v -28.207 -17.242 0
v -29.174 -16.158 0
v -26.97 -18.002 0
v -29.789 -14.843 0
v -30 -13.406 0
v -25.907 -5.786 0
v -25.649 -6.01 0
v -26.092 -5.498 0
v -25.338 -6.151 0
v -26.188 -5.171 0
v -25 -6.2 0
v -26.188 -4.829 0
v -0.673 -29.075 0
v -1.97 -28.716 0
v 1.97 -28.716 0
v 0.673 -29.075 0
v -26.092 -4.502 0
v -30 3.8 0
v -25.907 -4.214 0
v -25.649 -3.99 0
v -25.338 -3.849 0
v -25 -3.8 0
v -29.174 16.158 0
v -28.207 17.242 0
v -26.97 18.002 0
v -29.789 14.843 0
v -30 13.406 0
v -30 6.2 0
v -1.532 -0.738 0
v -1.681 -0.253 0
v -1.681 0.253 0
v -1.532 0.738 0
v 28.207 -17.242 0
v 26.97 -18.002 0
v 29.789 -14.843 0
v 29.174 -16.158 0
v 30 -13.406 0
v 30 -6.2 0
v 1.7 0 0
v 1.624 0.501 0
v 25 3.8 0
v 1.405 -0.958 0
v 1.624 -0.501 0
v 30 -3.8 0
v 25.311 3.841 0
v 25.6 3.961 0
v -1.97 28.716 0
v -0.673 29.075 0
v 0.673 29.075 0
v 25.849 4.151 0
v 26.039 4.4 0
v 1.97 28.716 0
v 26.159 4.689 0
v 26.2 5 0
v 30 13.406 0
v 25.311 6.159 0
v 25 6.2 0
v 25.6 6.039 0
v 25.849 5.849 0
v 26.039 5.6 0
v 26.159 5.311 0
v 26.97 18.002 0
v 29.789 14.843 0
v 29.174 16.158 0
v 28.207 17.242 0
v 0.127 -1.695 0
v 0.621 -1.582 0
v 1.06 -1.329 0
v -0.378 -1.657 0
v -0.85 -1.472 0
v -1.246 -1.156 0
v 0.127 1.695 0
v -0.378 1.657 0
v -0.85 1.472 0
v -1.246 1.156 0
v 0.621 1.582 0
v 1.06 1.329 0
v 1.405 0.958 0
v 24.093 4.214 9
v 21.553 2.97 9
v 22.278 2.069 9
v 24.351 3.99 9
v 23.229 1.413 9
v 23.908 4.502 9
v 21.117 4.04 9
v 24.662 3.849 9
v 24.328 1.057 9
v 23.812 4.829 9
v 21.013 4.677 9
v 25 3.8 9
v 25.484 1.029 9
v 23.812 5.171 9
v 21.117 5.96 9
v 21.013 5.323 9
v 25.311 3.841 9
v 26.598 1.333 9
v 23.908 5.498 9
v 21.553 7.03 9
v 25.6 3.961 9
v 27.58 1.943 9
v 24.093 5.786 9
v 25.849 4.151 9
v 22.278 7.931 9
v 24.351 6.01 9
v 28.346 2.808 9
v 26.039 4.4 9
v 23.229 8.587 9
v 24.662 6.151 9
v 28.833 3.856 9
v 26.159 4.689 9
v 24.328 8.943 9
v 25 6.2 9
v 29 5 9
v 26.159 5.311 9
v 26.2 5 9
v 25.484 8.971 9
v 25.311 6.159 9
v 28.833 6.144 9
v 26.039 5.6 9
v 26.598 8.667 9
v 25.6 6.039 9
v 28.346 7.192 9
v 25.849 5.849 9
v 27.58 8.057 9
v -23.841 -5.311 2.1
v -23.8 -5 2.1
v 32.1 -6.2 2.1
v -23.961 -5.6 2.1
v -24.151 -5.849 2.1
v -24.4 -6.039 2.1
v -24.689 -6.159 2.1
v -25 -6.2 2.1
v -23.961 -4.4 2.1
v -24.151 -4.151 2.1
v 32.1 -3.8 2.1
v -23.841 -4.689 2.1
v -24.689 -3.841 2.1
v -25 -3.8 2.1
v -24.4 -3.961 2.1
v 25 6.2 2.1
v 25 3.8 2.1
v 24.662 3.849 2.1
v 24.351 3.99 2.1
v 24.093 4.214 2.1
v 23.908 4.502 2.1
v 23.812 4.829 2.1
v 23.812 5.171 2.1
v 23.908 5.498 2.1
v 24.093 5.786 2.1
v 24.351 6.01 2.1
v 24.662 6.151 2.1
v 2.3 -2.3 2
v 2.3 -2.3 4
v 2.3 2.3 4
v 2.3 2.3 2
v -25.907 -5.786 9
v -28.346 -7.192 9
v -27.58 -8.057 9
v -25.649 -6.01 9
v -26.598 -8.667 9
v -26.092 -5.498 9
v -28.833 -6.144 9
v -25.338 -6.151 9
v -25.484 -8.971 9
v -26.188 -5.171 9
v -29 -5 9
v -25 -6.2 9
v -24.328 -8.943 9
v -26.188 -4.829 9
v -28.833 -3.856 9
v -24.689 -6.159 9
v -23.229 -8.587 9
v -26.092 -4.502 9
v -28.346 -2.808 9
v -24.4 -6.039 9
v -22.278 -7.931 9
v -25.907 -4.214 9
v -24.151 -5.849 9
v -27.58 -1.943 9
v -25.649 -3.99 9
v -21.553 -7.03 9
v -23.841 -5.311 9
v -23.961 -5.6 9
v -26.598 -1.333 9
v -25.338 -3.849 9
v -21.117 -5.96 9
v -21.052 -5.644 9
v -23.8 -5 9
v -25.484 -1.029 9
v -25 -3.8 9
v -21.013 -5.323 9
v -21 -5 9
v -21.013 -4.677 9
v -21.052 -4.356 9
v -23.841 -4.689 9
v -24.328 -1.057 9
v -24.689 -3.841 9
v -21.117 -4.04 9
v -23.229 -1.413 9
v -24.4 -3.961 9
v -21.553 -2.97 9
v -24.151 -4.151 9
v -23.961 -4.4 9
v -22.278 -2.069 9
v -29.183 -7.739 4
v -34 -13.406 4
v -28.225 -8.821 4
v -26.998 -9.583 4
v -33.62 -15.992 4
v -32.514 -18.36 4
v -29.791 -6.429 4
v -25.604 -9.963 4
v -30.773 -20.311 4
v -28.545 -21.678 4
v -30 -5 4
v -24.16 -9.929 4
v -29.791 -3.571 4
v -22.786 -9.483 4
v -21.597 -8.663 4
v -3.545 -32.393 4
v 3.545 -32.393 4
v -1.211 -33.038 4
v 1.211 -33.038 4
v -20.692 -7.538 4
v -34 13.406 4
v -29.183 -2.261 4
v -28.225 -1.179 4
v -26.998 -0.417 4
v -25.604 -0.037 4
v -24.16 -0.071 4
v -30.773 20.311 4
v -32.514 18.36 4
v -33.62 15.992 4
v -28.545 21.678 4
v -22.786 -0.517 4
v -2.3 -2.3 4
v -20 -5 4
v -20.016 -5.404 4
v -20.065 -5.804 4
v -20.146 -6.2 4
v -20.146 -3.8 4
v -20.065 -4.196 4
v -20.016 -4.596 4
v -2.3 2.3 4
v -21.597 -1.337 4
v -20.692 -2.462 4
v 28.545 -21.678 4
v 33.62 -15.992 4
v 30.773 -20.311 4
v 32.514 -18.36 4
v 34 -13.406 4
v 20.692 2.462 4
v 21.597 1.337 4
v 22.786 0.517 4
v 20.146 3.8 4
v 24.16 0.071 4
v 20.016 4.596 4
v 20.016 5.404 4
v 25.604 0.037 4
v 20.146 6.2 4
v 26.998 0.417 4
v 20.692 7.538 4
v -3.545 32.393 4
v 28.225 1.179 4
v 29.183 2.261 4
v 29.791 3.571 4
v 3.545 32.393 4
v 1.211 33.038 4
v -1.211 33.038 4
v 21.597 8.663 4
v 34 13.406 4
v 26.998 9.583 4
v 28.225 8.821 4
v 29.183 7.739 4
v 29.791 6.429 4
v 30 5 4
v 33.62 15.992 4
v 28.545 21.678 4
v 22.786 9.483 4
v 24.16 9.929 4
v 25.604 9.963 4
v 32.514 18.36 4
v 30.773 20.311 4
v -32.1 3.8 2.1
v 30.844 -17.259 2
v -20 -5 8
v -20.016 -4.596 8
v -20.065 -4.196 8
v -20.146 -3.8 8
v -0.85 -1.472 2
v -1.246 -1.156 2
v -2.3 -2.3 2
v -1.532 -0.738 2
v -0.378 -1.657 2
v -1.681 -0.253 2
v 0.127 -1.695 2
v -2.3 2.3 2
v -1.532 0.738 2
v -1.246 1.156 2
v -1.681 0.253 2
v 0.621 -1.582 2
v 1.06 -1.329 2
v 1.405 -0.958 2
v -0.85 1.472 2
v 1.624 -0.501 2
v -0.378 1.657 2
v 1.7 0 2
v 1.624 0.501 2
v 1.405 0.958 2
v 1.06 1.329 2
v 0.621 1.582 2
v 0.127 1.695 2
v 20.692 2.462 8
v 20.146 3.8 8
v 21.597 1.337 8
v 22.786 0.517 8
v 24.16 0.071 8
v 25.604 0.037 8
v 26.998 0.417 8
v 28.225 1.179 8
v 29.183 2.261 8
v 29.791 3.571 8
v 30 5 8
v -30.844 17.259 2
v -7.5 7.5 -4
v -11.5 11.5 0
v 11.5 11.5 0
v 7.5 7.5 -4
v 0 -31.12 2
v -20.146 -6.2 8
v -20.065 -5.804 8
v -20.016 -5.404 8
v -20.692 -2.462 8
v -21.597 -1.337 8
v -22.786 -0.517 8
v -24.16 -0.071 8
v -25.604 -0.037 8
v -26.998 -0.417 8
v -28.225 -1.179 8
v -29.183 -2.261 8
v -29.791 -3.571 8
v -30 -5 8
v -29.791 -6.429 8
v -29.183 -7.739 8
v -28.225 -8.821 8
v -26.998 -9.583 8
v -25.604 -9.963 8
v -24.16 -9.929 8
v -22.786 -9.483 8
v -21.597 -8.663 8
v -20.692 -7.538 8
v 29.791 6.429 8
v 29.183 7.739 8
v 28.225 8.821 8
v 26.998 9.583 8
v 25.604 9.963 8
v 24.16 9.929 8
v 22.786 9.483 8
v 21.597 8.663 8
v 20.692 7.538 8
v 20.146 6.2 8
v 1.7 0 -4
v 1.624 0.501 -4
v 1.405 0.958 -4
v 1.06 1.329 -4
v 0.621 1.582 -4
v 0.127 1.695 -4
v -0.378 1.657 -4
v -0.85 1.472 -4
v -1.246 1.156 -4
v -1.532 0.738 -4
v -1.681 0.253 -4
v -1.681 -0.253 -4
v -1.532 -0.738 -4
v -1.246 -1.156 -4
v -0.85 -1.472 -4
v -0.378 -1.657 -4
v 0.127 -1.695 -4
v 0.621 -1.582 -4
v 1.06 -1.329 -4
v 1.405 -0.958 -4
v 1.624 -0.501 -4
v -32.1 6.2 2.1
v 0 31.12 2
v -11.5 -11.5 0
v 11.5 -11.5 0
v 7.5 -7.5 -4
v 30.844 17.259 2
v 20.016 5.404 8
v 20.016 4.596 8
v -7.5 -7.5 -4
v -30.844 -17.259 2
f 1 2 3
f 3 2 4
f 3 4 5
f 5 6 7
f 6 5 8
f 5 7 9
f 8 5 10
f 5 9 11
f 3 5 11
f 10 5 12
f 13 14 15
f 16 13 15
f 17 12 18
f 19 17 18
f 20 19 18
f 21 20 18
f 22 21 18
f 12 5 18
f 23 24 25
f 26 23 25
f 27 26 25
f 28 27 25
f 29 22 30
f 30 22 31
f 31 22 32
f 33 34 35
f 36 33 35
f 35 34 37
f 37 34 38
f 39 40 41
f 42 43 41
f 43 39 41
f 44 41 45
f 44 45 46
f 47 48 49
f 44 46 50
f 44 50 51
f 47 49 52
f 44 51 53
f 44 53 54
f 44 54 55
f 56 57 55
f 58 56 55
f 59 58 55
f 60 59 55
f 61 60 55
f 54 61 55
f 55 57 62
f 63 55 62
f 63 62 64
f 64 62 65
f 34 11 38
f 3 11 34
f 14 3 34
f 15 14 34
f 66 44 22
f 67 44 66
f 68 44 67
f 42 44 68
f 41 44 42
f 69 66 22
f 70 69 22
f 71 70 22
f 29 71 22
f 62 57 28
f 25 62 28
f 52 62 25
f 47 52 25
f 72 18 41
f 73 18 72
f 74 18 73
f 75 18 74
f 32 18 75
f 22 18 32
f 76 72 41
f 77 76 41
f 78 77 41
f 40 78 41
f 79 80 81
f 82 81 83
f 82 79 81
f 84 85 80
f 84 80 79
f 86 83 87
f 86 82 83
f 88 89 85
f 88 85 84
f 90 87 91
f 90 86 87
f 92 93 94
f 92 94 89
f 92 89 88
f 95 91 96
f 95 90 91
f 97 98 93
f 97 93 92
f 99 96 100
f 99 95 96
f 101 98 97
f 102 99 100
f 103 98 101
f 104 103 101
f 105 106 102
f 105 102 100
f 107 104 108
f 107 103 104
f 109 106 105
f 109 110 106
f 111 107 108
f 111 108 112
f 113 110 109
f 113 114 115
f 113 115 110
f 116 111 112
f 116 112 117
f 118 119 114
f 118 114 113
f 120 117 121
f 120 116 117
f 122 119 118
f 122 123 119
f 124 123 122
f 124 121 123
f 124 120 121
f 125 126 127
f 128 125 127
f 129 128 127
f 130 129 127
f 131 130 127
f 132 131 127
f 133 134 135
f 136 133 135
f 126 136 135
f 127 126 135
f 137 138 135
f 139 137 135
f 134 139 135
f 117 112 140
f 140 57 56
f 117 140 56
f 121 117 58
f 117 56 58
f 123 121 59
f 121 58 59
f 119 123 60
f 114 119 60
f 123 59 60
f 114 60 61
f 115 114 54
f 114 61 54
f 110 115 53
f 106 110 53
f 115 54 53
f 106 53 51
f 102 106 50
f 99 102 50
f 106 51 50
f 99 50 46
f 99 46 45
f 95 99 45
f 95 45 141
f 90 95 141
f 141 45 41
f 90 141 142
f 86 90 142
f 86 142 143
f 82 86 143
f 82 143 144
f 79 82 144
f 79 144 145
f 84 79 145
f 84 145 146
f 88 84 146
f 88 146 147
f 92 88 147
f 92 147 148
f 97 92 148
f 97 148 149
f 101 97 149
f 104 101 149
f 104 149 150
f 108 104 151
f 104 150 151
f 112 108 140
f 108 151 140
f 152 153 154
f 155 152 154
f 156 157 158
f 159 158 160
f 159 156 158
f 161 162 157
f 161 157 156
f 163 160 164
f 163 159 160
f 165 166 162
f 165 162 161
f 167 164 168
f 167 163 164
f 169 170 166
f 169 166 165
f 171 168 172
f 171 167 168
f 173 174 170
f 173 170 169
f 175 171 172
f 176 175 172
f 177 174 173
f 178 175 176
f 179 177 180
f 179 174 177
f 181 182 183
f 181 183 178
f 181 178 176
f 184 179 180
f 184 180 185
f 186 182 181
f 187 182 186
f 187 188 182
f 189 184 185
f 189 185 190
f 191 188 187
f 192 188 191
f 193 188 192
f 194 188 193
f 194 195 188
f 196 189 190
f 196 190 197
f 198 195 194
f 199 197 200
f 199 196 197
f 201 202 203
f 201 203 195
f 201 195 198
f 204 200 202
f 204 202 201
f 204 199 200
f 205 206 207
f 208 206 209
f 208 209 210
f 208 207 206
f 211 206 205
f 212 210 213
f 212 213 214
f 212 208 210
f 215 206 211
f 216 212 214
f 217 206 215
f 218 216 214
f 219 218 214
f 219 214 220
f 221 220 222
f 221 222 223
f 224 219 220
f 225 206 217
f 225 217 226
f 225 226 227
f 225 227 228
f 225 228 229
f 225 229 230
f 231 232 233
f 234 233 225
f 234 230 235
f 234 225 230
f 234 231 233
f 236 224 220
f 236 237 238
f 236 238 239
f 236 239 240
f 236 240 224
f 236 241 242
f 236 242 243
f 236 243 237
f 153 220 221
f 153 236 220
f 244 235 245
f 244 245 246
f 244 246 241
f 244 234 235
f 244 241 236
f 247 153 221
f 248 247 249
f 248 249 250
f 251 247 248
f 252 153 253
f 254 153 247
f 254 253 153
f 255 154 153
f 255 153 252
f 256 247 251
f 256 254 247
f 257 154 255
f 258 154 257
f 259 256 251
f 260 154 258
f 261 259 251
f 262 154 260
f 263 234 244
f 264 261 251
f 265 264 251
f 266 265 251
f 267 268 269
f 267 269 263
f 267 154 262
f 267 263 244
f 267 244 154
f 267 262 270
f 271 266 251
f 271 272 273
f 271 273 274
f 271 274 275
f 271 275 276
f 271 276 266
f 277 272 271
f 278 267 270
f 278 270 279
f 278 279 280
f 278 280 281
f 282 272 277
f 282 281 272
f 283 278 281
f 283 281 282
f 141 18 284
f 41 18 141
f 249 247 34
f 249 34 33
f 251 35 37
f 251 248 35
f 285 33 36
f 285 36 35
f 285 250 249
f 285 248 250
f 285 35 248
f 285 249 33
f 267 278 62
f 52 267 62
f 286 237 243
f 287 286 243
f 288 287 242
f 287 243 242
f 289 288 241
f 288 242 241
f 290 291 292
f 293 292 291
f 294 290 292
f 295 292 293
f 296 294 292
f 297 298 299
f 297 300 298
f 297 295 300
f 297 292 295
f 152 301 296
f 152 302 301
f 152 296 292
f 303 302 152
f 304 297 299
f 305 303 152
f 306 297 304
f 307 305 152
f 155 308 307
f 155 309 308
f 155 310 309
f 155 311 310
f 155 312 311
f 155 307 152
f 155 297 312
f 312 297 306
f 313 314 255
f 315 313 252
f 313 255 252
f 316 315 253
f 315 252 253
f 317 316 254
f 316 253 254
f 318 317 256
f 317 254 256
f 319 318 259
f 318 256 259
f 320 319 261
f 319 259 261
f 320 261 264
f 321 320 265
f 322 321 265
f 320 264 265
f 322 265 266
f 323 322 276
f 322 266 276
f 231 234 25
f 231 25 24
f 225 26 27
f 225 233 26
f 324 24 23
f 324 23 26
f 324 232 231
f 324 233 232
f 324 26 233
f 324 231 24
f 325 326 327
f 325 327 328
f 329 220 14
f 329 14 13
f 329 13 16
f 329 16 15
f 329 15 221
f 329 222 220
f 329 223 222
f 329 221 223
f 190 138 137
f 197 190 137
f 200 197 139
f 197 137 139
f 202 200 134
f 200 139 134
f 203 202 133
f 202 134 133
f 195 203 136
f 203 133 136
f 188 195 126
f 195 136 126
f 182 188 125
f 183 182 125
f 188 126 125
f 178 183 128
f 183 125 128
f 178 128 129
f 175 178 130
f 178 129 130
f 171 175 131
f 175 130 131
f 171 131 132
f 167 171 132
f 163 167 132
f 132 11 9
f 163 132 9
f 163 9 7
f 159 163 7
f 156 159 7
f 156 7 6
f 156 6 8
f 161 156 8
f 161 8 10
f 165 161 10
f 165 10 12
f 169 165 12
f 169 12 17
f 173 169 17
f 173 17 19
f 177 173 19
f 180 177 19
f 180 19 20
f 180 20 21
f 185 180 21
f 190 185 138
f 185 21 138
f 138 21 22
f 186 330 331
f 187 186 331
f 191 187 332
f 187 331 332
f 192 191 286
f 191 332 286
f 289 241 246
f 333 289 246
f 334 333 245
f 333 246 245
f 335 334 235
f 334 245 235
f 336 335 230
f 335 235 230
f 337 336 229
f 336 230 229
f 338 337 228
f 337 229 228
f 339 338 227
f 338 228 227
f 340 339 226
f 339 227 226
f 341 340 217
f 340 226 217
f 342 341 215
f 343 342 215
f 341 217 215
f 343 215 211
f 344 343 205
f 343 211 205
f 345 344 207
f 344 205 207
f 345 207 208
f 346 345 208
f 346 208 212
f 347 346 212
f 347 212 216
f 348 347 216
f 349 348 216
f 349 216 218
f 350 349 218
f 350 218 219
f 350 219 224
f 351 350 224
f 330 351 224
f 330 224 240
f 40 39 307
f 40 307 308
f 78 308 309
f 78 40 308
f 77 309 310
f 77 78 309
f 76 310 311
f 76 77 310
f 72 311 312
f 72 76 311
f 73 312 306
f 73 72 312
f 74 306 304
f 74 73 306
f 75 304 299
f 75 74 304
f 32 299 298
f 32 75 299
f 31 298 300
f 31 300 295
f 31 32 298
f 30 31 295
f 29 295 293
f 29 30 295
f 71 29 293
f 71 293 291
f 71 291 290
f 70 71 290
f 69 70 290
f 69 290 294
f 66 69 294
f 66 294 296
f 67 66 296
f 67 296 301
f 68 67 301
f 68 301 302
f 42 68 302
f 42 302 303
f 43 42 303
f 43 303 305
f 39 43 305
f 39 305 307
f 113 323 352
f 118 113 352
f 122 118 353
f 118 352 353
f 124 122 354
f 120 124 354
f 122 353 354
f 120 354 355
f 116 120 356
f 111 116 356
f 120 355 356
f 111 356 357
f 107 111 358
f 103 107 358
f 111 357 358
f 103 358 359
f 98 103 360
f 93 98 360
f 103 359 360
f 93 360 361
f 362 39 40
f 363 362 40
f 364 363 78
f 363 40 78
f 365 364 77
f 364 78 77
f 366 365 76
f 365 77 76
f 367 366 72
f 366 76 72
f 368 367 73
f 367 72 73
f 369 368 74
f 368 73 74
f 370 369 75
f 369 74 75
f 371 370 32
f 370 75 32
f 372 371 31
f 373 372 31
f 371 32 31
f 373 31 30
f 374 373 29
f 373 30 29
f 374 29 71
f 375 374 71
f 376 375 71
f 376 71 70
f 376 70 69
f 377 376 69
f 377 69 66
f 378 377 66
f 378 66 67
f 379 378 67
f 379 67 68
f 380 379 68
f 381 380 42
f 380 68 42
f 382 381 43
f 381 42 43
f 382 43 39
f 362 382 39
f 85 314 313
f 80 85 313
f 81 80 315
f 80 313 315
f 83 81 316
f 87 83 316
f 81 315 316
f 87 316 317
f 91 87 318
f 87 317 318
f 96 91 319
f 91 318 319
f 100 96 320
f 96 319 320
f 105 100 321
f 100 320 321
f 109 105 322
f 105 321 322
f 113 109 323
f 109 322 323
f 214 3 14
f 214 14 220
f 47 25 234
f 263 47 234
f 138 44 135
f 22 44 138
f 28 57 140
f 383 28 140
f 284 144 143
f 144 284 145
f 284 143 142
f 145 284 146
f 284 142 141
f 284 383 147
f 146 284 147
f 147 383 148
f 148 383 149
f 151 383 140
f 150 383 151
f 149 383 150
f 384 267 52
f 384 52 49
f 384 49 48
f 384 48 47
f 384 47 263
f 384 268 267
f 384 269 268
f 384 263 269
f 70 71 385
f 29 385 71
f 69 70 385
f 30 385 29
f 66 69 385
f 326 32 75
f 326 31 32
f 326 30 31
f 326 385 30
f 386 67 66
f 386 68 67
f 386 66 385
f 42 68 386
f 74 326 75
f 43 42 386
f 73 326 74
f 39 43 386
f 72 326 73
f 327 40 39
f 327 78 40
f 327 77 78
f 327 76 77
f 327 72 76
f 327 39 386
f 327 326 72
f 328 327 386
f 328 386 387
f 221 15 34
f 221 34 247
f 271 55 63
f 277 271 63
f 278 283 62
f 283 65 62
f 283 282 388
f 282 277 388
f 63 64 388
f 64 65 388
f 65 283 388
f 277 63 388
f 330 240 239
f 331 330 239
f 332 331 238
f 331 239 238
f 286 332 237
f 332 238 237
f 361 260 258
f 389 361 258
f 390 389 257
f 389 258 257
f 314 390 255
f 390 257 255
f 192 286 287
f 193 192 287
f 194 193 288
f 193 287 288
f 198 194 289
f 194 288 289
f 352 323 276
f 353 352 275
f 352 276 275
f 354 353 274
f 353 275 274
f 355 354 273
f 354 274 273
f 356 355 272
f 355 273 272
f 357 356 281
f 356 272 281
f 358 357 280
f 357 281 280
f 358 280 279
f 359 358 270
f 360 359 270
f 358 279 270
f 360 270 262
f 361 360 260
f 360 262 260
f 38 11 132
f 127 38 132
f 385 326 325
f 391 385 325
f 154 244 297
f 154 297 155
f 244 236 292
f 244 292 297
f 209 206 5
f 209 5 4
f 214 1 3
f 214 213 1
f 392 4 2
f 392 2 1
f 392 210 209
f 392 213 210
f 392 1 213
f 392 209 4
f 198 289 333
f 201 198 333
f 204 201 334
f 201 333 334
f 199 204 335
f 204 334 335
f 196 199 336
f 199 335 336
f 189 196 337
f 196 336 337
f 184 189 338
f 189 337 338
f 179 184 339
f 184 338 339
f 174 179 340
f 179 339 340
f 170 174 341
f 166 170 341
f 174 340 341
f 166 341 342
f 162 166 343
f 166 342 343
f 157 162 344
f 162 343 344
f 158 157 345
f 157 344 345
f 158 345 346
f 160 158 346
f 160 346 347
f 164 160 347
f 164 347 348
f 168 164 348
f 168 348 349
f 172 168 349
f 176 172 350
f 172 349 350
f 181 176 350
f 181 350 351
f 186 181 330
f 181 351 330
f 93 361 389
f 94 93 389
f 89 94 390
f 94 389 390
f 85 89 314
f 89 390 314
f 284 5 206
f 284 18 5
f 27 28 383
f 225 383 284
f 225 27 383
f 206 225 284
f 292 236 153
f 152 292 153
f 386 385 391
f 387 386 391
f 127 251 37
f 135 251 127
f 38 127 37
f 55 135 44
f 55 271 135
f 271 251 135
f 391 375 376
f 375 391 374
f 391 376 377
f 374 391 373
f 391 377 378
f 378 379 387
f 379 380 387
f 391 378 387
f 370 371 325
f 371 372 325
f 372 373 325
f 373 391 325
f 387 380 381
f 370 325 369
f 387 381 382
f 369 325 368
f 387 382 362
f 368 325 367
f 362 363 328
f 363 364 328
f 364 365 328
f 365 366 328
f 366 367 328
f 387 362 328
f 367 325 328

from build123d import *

# Parameters (mm, degrees)
F0_W           = 25
F0_H           = 6.3
F0_H_2         = 2.4
F0_H_3         = 7.6
F0_R           = 1.7
F0_W_2         = 22.5
F1_DEPTH       = 4
F2_DEPTH       = 9
F3_DEPTH       = 2.1
F4_DEPTH       = 4
F5_T1_DEPTH    = 50.7168298797
F5_T3_DEPTH    = 50.7168298797
F5_2_T1_DEPTH  = 27.1991896638
F5_2_T3_DEPTH  = 20.06445336
F5_2_T5_DEPTH  = 27.1991896638
F5_2_T7_DEPTH  = 30.06445336
F5_2_T9_DEPTH  = 27.1991896638
F5_2_T11_DEPTH = 20.06445336
F5_2_T13_DEPTH = 27.1991896638
F5_2_T15_DEPTH = 30.06445336
F5_2_T18_ANGLE = 66.8014094864
F5_2_T20_ANGLE = 46.3971810273
F5_2_T22_ANGLE = 66.8014094864
F5_2_T24_ANGLE = 66.8014094864
F5_2_T26_ANGLE = 46.3971810273
F5_2_T28_ANGLE = 66.8014094864
F6_SIZE        = 1
F7_W           = 4.6
F7_H           = 4.6
F7_R           = 1.7
F8_DEPTH       = 2


# Not quite as in the source:
# - a fillet or chamfer that OpenCascade refuses, or shapes differently, is made with other operations: its cross-section is extruded or revolved along the edge and cut away or added


with BuildPart() as f1:
    # F0 (on Top) → F1 (new body)
    with BuildSketch(Plane.XY):
        with BuildLine():
            Line((-12.5, -3.8), (-12.5, 3.8))
            Line((-12.5, 3.8), (-35, 3.8))
            Line((-35, 3.8), (-35, 0.3032439272))
            Line((-35, 0.3032439272), (-35, -0.3032439272))
            Line((-35, -0.3032439272), (-35, -13.4060384202))
            ThreePointArc((-35, -13.4060384202), (-33.3484109224, -18.9109485077), (-28.9391929858, -22.5974887204))
            Line((-28.9391929858, -22.5974887204), (-3.9391929858, -33.3117744347))
            ThreePointArc((-3.9391929858, -33.3117744347), (0, -34.1203241345), (3.9391929858, -33.3117744347))
            Line((3.9391929858, -33.3117744347), (28.9391929858, -22.5974887204))
            ThreePointArc((28.9391929858, -22.5974887204), (33.3484109224, -18.9109485077), (35, -13.4060384202))
            Line((35, -13.4060384202), (35, -6.2))
            Line((35, -6.2), (12.5, -6.2))
            Line((12.5, -6.2), (12.5, -12.5))
            Line((12.5, -12.5), (-12.5, -12.5))
            Line((-12.5, -12.5), (-12.5, -6.2))
            Line((-12.5, -6.2), (-20.1461355602, -6.2))
            ThreePointArc((-20.1461355602, -6.2), (-30, -5), (-20.1461355602, -3.8))
            Line((-20.1461355602, -3.8), (-12.5, -3.8))
        make_face()
        with BuildLine():
            ThreePointArc((20.1461355602, 6.2), (25.6044327096, 9.9633316532), (30, 5))
            ThreePointArc((30, 5), (25.6044327096, 0.0366683468), (20.1461355602, 3.8))
            Line((20.1461355602, 3.8), (12.5, 3.8))
            Line((12.5, 3.8), (12.5, -3.8))
            Line((12.5, -3.8), (35, -3.8))
            Line((35, -3.8), (35, -0.49606018))
            Line((35, -0.49606018), (35, 0.49606018))
            Line((35, 0.49606018), (35, 13.4060384202))
            ThreePointArc((35, 13.4060384202), (33.3484109224, 18.9109485077), (28.9391929858, 22.5974887204))
            Line((28.9391929858, 22.5974887204), (3.9391929858, 33.3117744347))
            ThreePointArc((3.9391929858, 33.3117744347), (0, 34.1203241345), (-3.9391929858, 33.3117744347))
            Line((-3.9391929858, 33.3117744347), (-28.9391929858, 22.5974887204))
            ThreePointArc((-28.9391929858, 22.5974887204), (-33.3484109224, 18.9109485077), (-35, 13.4060384202))
            Line((-35, 13.4060384202), (-35, 6.2))
            Line((-35, 6.2), (-12.5, 6.2))
            Line((-12.5, 6.2), (-12.5, 12.5))
            Line((-12.5, 12.5), (12.5, 12.5))
            Line((12.5, 12.5), (12.5, 6.2))
            Line((12.5, 6.2), (20.1461355602, 6.2))
        make_face()
        with BuildLine():
            ThreePointArc((20.1461355602, 3.8), (25.6044327096, 0.0366683468), (30, 5))
            ThreePointArc((30, 5), (25.6044327096, 9.9633316532), (20.1461355602, 6.2))
            Line((20.1461355602, 6.2), (25, 6.2))
            ThreePointArc((25, 6.2), (25.8485281374, 5.8485281374), (26.2, 5))
            ThreePointArc((26.2, 5), (25.8485281374, 4.1514718626), (25, 3.8))
            Line((25, 3.8), (20.1461355602, 3.8))
        make_face()
        with BuildLine():
            Line((25, 6.2), (20.1461355602, 6.2))
            ThreePointArc((20.1461355602, 6.2), (20, 5), (20.1461355602, 3.8))
            Line((20.1461355602, 3.8), (25, 3.8))
            ThreePointArc((25, 3.8), (23.8, 5), (25, 6.2))
        make_face()
        with BuildLine():
            ThreePointArc((20.1461355602, 3.8), (20, 5), (20.1461355602, 6.2))
            Line((20.1461355602, 6.2), (12.5, 6.2))
            Line((12.5, 6.2), (12.5, 3.8))
            Line((12.5, 3.8), (20.1461355602, 3.8))
        make_face()
        with Locations((0, 9.35)):
            Rectangle(F0_W, F0_H)
        with Locations((0, 5)):
            Rectangle(F0_W, F0_H_2)
        Rectangle(F0_W, F0_H_3)
        Circle(F0_R, mode=Mode.SUBTRACT)
        with Locations((-23.75, 5)):
            Rectangle(F0_W_2, F0_H_2)
        with BuildLine():
            Line((-25, -3.8), (-20.1461355602, -3.8))
            ThreePointArc((-20.1461355602, -3.8), (-30, -5), (-20.1461355602, -6.2))
            Line((-20.1461355602, -6.2), (-25, -6.2))
            ThreePointArc((-25, -6.2), (-26.2, -5), (-25, -3.8))
        make_face()
        with BuildLine():
            ThreePointArc((-20, -5), (-20.0366683468, -4.3955672904), (-20.1461355602, -3.8))
            Line((-20.1461355602, -3.8), (-25, -3.8))
            ThreePointArc((-25, -3.8), (-24.1514718626, -4.1514718626), (-23.8, -5))
            ThreePointArc((-23.8, -5), (-24.1514718626, -5.8485281374), (-25, -6.2))
            Line((-25, -6.2), (-20.1461355602, -6.2))
            ThreePointArc((-20.1461355602, -6.2), (-20.0366683468, -5.6044327096), (-20, -5))
        make_face()
        with Locations((23.75, -5)):
            Rectangle(F0_W_2, F0_H_2)
        with Locations((0, -9.35)):
            Rectangle(F0_W, F0_H)
        with BuildLine():
            Line((-12.5, -6.2), (-12.5, -3.8))
            Line((-12.5, -3.8), (-20.1461355602, -3.8))
            ThreePointArc((-20.1461355602, -3.8), (-20.0366683468, -4.3955672904), (-20, -5))
            ThreePointArc((-20, -5), (-20.0366683468, -5.6044327096), (-20.1461355602, -6.2))
            Line((-20.1461355602, -6.2), (-12.5, -6.2))
        make_face()
        with Locations((0, -5)):
            Rectangle(F0_W, F0_H_2)
    extrude(amount=F1_DEPTH)

    # F0 (on Top) → F2 (join)
    with BuildSketch(Plane.XY):
        with BuildLine():
            Line((-25, -3.8), (-20.1461355602, -3.8))
            ThreePointArc((-20.1461355602, -3.8), (-30, -5), (-20.1461355602, -6.2))
            Line((-20.1461355602, -6.2), (-25, -6.2))
            ThreePointArc((-25, -6.2), (-26.2, -5), (-25, -3.8))
        make_face()
        with BuildLine():
            ThreePointArc((20.1461355602, 3.8), (25.6044327096, 0.0366683468), (30, 5))
            ThreePointArc((30, 5), (25.6044327096, 9.9633316532), (20.1461355602, 6.2))
            Line((20.1461355602, 6.2), (25, 6.2))
            ThreePointArc((25, 6.2), (25.8485281374, 5.8485281374), (26.2, 5))
            ThreePointArc((26.2, 5), (25.8485281374, 4.1514718626), (25, 3.8))
            Line((25, 3.8), (20.1461355602, 3.8))
        make_face()
        with BuildLine():
            Line((25, 6.2), (20.1461355602, 6.2))
            ThreePointArc((20.1461355602, 6.2), (20, 5), (20.1461355602, 3.8))
            Line((20.1461355602, 3.8), (25, 3.8))
            ThreePointArc((25, 3.8), (23.8, 5), (25, 6.2))
        make_face()
        with BuildLine():
            ThreePointArc((-20, -5), (-20.0366683468, -4.3955672904), (-20.1461355602, -3.8))
            Line((-20.1461355602, -3.8), (-25, -3.8))
            ThreePointArc((-25, -3.8), (-24.1514718626, -4.1514718626), (-23.8, -5))
            ThreePointArc((-23.8, -5), (-24.1514718626, -5.8485281374), (-25, -6.2))
            Line((-25, -6.2), (-20.1461355602, -6.2))
            ThreePointArc((-20.1461355602, -6.2), (-20.0366683468, -5.6044327096), (-20, -5))
        make_face()
    extrude(amount=F2_DEPTH)

    # F0 (on Top) → F3 (cut)
    with BuildSketch(Plane.XY):
        with BuildLine():
            ThreePointArc((-20, -5), (-20.0366683468, -4.3955672904), (-20.1461355602, -3.8))
            Line((-20.1461355602, -3.8), (-25, -3.8))
            ThreePointArc((-25, -3.8), (-24.1514718626, -4.1514718626), (-23.8, -5))
            ThreePointArc((-23.8, -5), (-24.1514718626, -5.8485281374), (-25, -6.2))
            Line((-25, -6.2), (-20.1461355602, -6.2))
            ThreePointArc((-20.1461355602, -6.2), (-20.0366683468, -5.6044327096), (-20, -5))
        make_face()
        with BuildLine():
            Line((-12.5, -6.2), (-12.5, -3.8))
            Line((-12.5, -3.8), (-20.1461355602, -3.8))
            ThreePointArc((-20.1461355602, -3.8), (-20.0366683468, -4.3955672904), (-20, -5))
            ThreePointArc((-20, -5), (-20.0366683468, -5.6044327096), (-20.1461355602, -6.2))
            Line((-20.1461355602, -6.2), (-12.5, -6.2))
        make_face()
        with Locations((0, -5)):
            Rectangle(F0_W, F0_H_2)
        with Locations((23.75, -5)):
            Rectangle(F0_W_2, F0_H_2)
        with BuildLine():
            Line((25, 6.2), (20.1461355602, 6.2))
            ThreePointArc((20.1461355602, 6.2), (20, 5), (20.1461355602, 3.8))
            Line((20.1461355602, 3.8), (25, 3.8))
            ThreePointArc((25, 3.8), (23.8, 5), (25, 6.2))
        make_face()
        with BuildLine():
            ThreePointArc((20.1461355602, 3.8), (20, 5), (20.1461355602, 6.2))
            Line((20.1461355602, 6.2), (12.5, 6.2))
            Line((12.5, 6.2), (12.5, 3.8))
            Line((12.5, 3.8), (20.1461355602, 3.8))
        make_face()
        with Locations((0, 5)):
            Rectangle(F0_W, F0_H_2)
        with Locations((-23.75, 5)):
            Rectangle(F0_W_2, F0_H_2)
    extrude(amount=F3_DEPTH, mode=Mode.SUBTRACT)

    # F5#2: chamfer of 5 on 2 edges, made by hand

    # F5_2_s2 → F5_2_t1 (cut)
    with BuildSketch(Plane(origin=(8.7332208073, 3.7428089174, 0), x_dir=(0, 0, 1), z_dir=(-0.91914503, -0.3939192986, 0))):
        Polygon((0, 27.1700760506), (5, 32.1700760506), (0, 32.1700760506), align=None)
    extrude(amount=F5_2_T1_DEPTH, mode=Mode.SUBTRACT)

    # F5_2_s4 → F5_2_t3 (cut)
    with BuildSketch(Plane.XZ.offset(-13.4060384202)):
        Polygon((-30, 0), (-35, 5), (-35, 0), align=None)
    extrude(amount=F5_2_T3_DEPTH, mode=Mode.SUBTRACT)

    # F5_2_s6 → F5_2_t5 (cut)
    with BuildSketch(Plane(origin=(16.2667791927, -6.9714767969, 0), x_dir=(0, 0, 1), z_dir=(-0.91914503, 0.3939192986, 0))):
        Polygon((5, 32.1700760506), (0, 27.1700760506), (0, 32.1700760506), align=None)
    extrude(amount=F5_2_T5_DEPTH, mode=Mode.SUBTRACT)

    # F5_2_s8 → F5_2_t7 (cut)
    with BuildSketch(Plane.XZ.offset(-13.4060384202)):
        Polygon((35, 5), (30, 0), (35, 0), align=None)
    extrude(amount=F5_2_T7_DEPTH, mode=Mode.SUBTRACT)

    # F5_2_s10 → F5_2_t9 (cut)
    with BuildSketch(Plane(origin=(-8.7332208073, -3.7428089174, 0), x_dir=(0, 0, 1), z_dir=(0.91914503, 0.3939192986, 0))):
        Polygon((0, 27.1700760506), (5, 32.1700760506), (0, 32.1700760506), align=None)
    extrude(amount=F5_2_T9_DEPTH, mode=Mode.SUBTRACT)

    # F5_2_s12 → F5_2_t11 (cut)
    with BuildSketch(Plane.XZ.offset(-6.6584149398)):
        Polygon((35, 5), (30, 0), (35, 0), align=None)
    extrude(amount=F5_2_T11_DEPTH, mode=Mode.SUBTRACT)

    # F5_2_s14 → F5_2_t13 (cut)
    with BuildSketch(Plane(origin=(-16.2667791927, 6.9714767969, 0), x_dir=(0, 0, 1), z_dir=(0.91914503, -0.3939192986, 0))):
        Polygon((0, 27.1700760506), (5, 32.1700760506), (0, 32.1700760506), align=None)
    extrude(amount=F5_2_T13_DEPTH, mode=Mode.SUBTRACT)

    # F5_2_s16 → F5_2_t15 (cut)
    with BuildSketch(Plane.XZ.offset(-16.6584149398)):
        Polygon((-30, 0), (-35, 5), (-35, 0), align=None)
    extrude(amount=F5_2_T15_DEPTH, mode=Mode.SUBTRACT)

    # F5_2_s17 → F5_2_t18 (revolve, cut)
    with BuildSketch(Plane(origin=(16.2667791927, 6.9714767969, 0), x_dir=(0, 0, 1), z_dir=(-0.91914503, -0.3939192986, 0))):
        Polygon((0, -27.1700760506), (5, -32.1700760506), (0, -32.1700760506), align=None)
    revolve(axis=Axis((25, -13.4060384202, 0), (0, 0, 1)), revolution_arc=F5_2_T18_ANGLE, mode=Mode.SUBTRACT)

    # F5_2_s19 → F5_2_t20 (revolve, cut)
    with BuildSketch(Plane(origin=(-8.7332208073, 3.7428089174, 0), x_dir=(0, 0, 1), z_dir=(0.91914503, -0.3939192986, 0))):
        Polygon((0, -27.1700760506), (5, -32.1700760506), (0, -32.1700760506), align=None)
    revolve(axis=Axis((0, 24.1203241345, 0), (0, 0, 1)), revolution_arc=F5_2_T20_ANGLE, mode=Mode.SUBTRACT)

    # F5_2_s21 → F5_2_t22 (revolve, cut)
    with BuildSketch(Plane(origin=(-16.2667791927, -6.9714767969, 0), x_dir=(0, 0, 1), z_dir=(0.91914503, 0.3939192986, 0))):
        Polygon((0, -27.1700760506), (5, -32.1700760506), (0, -32.1700760506), align=None)
    revolve(axis=Axis((-25, 13.4060384202, 0), (0, 0, 1)), revolution_arc=F5_2_T22_ANGLE, mode=Mode.SUBTRACT)

    # F5_2_s23 → F5_2_t24 (revolve, cut)
    with BuildSketch(Plane.XZ.offset(-13.4060384202)):
        Polygon((35, 5), (30, 0), (35, 0), align=None)
    revolve(axis=Axis((25, 13.4060384202, 0), (0, 0, 1)), revolution_arc=F5_2_T24_ANGLE, mode=Mode.SUBTRACT)

    # F5_2_s25 → F5_2_t26 (revolve, cut)
    with BuildSketch(Plane(origin=(8.7332208073, -3.7428089174, 0), x_dir=(0, 0, 1), z_dir=(-0.91914503, 0.3939192986, 0))):
        Polygon((0, -27.1700760506), (5, -32.1700760506), (0, -32.1700760506), align=None)
    revolve(axis=Axis((0, -24.1203241345, 0), (0, 0, 1)), revolution_arc=F5_2_T26_ANGLE, mode=Mode.SUBTRACT)

    # F5_2_s27 → F5_2_t28 (revolve, cut)
    with BuildSketch(Plane.XZ.offset(13.4060384202)):
        Polygon((-30, 0), (-35, 5), (-35, 0), align=None)
    revolve(axis=Axis((-25, -13.4060384202, 0), (0, 0, 1)), revolution_arc=F5_2_T28_ANGLE, mode=Mode.SUBTRACT)

    # F6
    f6_edges = [f1.edges().sort_by_distance(p)[0] for p in [
        (29.853864, 3.8, 9),
        (-29.853864, -3.8, 9),
    ]]
    chamfer(f6_edges, length=F6_SIZE)

    # F7 (on face) → F8 (cut)
    with BuildSketch(Plane.XY.offset(4)):
        Rectangle(F7_W, F7_H)
        Circle(F7_R, mode=Mode.SUBTRACT)
    extrude(amount=-F8_DEPTH, mode=Mode.SUBTRACT)


with BuildPart() as f4:
    # F0 (on Top) → F4 (new body)
    with BuildSketch(Plane.XY):
        with Locations((0, -9.35)):
            Rectangle(F0_W, F0_H)
        with Locations((0, -5)):
            Rectangle(F0_W, F0_H_2)
        Rectangle(F0_W, F0_H_3)
        Circle(F0_R, mode=Mode.SUBTRACT)
        with Locations((0, 5)):
            Rectangle(F0_W, F0_H_2)
        with Locations((0, 9.35)):
            Rectangle(F0_W, F0_H)
    extrude(amount=-F4_DEPTH)

    # F5: chamfer of 5 on 4 edges, made by hand

    # F5_s2 → F5_t1 (cut)
    with BuildSketch(Plane.XZ.offset(-25.3584149398)):
        Polygon((12.5, 1), (7.5, -4), (12.5, -4), align=None)
        Polygon((-12.5, 1), (-7.5, -4), (-12.5, -4), align=None)
    extrude(amount=F5_T1_DEPTH, mode=Mode.SUBTRACT)

    # F5_s4 → F5_t3 (cut)
    with BuildSketch(Plane.YZ.offset(-25.3584149398)):
        Polygon((-12.5, 1), (-7.5, -4), (-12.5, -4), align=None)
        Polygon((12.5, 1), (7.5, -4), (12.5, -4), align=None)
    extrude(amount=F5_T3_DEPTH, mode=Mode.SUBTRACT)


solid = Compound([f1.part, f4.part])
